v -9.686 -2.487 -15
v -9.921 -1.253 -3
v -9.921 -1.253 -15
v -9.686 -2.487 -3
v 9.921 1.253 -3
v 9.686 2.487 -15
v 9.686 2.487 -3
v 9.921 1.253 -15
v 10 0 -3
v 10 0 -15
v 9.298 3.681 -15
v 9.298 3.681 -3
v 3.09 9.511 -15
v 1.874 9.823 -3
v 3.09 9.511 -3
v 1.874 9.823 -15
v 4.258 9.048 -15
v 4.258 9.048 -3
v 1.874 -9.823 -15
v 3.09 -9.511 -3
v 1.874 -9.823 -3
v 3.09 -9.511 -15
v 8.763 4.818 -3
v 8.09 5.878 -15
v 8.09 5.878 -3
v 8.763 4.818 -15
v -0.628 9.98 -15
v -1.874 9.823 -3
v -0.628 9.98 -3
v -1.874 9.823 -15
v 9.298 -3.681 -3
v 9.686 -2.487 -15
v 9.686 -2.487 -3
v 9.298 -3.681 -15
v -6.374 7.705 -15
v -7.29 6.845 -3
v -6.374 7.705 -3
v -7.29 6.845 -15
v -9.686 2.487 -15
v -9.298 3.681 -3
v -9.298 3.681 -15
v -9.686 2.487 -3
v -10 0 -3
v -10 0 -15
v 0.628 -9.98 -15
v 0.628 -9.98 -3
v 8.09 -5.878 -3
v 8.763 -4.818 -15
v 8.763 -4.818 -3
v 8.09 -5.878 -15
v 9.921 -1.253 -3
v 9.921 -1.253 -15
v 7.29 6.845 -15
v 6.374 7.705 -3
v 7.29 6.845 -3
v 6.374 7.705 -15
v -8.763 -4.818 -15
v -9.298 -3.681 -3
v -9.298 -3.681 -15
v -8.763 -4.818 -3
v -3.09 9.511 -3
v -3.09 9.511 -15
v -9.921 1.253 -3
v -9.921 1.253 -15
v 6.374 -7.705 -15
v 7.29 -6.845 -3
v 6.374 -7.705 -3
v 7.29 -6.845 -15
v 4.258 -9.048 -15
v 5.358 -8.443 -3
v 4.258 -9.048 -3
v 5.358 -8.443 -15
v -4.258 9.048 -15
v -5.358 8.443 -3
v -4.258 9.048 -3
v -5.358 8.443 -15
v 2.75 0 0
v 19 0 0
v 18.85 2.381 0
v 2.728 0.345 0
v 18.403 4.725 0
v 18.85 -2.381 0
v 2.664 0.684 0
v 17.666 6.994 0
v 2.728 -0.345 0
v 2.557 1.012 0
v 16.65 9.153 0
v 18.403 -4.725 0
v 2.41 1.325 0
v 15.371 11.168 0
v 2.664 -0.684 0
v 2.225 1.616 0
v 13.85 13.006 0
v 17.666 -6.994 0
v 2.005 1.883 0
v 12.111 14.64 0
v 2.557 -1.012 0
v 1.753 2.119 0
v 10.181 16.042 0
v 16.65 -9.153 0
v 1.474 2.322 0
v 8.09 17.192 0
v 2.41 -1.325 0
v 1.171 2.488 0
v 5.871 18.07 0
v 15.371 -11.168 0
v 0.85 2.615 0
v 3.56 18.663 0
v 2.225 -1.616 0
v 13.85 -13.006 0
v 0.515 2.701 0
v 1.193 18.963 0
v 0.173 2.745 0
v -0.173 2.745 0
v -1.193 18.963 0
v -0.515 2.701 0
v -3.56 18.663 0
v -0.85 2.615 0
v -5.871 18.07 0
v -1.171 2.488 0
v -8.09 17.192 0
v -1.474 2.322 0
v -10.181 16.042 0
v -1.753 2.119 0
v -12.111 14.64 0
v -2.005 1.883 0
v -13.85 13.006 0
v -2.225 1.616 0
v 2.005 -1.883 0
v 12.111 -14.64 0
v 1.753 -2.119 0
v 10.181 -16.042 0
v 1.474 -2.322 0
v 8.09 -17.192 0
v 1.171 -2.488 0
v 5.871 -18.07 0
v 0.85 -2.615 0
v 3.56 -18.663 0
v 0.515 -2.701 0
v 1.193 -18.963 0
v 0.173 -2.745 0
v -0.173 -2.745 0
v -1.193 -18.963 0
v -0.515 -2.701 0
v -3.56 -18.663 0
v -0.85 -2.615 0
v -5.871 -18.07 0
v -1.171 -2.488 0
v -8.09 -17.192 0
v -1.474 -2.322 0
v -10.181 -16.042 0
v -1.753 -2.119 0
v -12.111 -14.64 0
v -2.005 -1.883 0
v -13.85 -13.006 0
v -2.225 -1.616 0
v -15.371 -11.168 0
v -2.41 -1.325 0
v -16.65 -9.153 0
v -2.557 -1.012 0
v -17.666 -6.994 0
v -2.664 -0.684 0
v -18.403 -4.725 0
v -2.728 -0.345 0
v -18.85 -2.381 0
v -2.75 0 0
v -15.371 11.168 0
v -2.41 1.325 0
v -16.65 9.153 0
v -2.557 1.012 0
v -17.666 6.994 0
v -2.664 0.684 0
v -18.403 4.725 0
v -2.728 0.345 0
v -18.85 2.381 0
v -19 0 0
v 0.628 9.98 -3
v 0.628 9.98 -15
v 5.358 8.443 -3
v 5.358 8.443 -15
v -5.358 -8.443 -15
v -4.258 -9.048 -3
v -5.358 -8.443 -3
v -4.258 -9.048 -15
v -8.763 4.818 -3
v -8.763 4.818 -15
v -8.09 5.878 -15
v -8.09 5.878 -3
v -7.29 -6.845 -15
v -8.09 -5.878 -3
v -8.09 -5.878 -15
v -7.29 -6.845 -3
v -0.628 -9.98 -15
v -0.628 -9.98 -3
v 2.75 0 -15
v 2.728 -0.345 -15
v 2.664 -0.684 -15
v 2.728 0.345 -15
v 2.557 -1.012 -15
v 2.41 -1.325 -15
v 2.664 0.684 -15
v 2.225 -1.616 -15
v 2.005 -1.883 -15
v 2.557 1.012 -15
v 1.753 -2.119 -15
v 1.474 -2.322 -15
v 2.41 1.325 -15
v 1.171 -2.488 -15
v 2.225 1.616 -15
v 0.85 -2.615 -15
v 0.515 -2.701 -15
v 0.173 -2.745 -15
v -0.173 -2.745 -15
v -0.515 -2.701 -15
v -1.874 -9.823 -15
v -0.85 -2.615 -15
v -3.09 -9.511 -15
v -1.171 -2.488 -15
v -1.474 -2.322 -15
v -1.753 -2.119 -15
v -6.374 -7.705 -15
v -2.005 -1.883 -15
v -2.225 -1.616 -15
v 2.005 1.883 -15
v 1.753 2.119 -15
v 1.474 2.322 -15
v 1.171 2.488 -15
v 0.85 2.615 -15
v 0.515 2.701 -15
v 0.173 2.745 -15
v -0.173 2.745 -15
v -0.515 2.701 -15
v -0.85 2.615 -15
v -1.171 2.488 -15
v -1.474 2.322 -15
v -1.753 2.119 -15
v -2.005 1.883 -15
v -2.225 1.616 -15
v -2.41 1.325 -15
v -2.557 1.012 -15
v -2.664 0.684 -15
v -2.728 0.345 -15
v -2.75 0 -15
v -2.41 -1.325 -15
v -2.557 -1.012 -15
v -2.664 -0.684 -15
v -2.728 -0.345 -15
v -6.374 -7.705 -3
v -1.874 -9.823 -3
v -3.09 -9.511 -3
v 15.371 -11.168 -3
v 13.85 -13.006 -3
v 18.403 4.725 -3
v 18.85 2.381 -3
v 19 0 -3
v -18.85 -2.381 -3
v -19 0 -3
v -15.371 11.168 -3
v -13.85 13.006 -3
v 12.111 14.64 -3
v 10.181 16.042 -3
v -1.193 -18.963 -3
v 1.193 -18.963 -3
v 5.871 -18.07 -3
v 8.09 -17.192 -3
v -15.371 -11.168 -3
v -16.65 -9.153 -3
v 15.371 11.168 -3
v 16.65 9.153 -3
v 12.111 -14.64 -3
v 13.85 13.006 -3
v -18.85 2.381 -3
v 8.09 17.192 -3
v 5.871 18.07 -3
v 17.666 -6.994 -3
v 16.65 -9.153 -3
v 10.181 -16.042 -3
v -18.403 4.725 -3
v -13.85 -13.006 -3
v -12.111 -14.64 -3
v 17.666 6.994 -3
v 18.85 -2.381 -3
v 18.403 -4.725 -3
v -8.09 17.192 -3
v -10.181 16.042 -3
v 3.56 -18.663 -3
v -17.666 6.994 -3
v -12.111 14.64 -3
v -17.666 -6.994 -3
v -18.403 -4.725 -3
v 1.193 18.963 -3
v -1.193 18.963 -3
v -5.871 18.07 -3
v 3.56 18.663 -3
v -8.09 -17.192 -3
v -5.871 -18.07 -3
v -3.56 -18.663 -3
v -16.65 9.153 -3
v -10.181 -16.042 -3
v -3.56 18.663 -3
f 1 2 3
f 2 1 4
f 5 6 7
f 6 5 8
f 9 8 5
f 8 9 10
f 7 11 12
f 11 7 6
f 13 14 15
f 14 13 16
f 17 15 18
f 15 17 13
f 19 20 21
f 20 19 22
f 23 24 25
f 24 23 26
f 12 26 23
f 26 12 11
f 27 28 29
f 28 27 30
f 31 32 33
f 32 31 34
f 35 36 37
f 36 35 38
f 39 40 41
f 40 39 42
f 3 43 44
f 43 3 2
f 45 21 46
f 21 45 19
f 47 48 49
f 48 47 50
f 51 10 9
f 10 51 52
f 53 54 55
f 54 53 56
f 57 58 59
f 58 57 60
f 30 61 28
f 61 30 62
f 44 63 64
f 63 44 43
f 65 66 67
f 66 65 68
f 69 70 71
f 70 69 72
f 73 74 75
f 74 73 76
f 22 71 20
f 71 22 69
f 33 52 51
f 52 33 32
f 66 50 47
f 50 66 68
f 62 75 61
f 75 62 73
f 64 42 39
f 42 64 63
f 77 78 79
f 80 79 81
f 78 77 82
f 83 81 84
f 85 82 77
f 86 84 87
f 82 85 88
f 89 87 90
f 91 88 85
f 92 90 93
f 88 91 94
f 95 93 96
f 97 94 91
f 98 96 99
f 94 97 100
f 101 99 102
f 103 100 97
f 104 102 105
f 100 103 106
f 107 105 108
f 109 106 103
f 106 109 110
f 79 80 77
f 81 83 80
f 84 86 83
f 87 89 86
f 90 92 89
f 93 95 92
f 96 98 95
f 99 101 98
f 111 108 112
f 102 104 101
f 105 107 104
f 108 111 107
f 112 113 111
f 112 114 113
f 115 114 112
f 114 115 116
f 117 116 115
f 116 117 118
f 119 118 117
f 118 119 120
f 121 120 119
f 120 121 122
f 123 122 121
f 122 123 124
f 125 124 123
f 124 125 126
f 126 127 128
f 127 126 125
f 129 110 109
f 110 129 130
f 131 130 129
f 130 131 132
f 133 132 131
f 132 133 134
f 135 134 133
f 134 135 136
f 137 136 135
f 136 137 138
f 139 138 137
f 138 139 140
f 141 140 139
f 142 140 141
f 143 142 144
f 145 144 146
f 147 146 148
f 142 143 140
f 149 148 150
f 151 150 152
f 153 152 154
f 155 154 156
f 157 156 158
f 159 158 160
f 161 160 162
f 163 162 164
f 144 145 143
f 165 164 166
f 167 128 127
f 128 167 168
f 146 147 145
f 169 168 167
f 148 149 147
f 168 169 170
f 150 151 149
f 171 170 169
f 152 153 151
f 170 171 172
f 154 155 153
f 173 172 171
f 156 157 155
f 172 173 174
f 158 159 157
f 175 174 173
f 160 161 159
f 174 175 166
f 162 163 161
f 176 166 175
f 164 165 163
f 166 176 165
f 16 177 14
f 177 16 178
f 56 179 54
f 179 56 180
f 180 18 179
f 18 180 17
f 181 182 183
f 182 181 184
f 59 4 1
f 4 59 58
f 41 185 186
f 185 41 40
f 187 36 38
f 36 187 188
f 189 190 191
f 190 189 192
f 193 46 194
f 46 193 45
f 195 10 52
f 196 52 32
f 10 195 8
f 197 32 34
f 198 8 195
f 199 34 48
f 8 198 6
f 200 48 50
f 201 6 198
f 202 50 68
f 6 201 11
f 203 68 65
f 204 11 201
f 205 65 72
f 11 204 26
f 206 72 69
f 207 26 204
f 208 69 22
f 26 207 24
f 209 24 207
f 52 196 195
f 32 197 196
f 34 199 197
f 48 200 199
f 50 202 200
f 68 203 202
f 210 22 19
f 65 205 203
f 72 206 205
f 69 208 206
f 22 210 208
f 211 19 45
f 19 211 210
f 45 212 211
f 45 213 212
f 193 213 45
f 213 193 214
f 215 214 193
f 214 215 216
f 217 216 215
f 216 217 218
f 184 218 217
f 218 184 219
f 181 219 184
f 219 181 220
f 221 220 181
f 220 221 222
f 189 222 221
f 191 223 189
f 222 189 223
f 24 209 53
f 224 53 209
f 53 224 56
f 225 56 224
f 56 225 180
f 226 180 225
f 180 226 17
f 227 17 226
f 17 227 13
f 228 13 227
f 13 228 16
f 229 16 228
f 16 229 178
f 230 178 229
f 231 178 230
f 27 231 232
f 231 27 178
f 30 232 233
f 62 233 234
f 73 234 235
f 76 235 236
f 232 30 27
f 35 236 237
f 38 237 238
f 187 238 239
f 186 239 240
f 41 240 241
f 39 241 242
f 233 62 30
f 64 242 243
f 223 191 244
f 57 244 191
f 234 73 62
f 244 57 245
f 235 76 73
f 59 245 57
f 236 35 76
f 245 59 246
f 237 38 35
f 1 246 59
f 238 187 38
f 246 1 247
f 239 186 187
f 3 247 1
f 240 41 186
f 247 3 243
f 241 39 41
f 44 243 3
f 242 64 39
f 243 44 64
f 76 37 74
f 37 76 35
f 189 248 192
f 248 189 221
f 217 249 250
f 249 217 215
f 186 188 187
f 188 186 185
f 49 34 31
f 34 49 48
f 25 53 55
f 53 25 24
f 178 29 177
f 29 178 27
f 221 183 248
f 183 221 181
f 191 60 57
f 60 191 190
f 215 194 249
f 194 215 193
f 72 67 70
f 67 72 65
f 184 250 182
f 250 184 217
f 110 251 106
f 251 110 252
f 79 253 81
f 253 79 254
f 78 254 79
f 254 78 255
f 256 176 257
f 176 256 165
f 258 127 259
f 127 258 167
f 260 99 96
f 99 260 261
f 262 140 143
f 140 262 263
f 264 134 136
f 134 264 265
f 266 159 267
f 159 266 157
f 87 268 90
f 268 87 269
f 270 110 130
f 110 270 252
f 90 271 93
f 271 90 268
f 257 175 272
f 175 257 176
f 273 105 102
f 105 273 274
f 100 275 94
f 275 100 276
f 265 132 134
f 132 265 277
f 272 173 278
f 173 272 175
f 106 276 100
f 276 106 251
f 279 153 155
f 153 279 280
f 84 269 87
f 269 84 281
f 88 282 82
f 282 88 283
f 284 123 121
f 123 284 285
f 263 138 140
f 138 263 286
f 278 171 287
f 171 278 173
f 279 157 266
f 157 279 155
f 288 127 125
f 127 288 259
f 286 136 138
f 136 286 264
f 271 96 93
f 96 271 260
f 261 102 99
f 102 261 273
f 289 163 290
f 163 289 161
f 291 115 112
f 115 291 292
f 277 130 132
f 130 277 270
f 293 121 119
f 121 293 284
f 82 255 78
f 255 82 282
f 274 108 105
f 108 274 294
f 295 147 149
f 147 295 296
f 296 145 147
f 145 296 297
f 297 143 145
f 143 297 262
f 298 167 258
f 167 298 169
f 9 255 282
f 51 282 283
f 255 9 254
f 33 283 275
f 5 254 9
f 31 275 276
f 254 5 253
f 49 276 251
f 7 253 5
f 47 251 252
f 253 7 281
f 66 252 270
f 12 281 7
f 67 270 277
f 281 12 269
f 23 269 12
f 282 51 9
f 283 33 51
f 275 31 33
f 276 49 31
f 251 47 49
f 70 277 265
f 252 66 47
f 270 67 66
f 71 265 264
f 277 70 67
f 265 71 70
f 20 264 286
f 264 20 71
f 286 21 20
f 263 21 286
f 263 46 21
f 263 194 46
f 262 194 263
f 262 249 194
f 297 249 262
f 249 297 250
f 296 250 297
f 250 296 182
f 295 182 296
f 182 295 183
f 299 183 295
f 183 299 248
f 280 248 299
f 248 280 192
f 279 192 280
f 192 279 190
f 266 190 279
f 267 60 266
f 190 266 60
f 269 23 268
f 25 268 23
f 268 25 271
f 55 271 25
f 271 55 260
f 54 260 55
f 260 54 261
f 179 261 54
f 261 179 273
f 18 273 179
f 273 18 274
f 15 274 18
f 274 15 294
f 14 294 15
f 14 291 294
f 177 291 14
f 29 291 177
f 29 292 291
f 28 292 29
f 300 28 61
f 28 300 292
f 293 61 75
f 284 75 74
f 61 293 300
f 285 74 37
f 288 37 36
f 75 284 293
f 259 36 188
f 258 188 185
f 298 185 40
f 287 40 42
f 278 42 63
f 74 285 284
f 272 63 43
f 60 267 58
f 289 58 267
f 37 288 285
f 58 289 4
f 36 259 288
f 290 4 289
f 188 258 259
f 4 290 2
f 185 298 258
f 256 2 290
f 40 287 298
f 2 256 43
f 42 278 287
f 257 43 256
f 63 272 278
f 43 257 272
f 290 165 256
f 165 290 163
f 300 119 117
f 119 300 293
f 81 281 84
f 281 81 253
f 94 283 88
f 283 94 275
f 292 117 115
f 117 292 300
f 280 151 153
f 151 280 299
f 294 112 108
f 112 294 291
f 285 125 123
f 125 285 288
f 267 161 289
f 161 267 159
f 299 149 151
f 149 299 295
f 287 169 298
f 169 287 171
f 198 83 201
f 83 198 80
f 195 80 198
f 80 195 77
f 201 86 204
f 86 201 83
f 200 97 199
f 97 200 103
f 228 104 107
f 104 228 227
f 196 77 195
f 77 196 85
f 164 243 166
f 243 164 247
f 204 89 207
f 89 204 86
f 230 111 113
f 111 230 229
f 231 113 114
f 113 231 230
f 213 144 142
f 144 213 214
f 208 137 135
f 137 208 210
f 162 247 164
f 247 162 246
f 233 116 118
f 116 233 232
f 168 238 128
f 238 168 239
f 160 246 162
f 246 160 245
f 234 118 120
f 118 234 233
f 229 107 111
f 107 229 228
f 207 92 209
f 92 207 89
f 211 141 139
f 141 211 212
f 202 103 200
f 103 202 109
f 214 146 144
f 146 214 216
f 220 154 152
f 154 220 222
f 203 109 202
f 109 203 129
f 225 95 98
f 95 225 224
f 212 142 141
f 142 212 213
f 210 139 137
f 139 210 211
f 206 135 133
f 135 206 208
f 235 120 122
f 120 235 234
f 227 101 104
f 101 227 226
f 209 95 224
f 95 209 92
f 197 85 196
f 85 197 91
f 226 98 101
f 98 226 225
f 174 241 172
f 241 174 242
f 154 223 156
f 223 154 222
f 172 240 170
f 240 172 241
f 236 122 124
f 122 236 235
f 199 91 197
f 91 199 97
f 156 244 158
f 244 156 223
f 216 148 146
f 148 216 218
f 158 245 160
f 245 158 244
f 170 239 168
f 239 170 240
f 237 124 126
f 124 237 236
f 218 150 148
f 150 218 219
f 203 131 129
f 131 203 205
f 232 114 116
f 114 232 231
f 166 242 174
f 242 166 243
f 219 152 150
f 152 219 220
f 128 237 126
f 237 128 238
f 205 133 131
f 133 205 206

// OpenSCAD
$fn = 50;


difference() {
	union() {
		translate(v = [0, 0, -15.0000000000]) {
			cylinder(h = 15, r = 10.0000000000);
		}
		translate(v = [0, 0, -3.0000000000]) {
			cylinder(h = 3, r = 19.0000000000);
		}
	}
	union() {
		#translate(v = [0, 0, -15]) {
			cylinder(h = 15, r = 2.7500000000);
		}
	}
}
